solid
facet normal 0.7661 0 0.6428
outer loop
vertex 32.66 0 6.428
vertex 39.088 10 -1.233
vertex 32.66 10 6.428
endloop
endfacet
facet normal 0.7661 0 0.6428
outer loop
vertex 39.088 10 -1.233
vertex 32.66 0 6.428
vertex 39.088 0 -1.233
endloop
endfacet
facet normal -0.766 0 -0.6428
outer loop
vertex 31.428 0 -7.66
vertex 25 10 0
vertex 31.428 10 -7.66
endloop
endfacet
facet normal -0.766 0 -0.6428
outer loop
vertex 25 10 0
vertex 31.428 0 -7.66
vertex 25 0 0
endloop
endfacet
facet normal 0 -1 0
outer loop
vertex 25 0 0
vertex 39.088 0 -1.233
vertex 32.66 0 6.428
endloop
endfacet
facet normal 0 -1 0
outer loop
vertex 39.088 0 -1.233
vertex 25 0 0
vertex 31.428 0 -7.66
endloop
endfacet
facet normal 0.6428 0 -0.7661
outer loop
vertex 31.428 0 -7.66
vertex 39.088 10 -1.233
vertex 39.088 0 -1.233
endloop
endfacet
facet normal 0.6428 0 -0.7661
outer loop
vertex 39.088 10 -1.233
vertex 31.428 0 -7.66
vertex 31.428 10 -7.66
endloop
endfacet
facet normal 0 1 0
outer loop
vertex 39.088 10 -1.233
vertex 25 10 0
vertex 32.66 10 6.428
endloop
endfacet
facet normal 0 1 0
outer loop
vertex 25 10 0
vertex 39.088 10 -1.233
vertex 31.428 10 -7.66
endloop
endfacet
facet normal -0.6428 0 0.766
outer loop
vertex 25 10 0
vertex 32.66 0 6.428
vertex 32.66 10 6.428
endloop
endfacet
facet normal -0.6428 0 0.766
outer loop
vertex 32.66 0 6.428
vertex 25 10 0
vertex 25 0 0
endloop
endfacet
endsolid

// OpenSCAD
translate([25,0,0]){
	rotate([0,50,0]){
		cube([10,10,10]);
	}
}
